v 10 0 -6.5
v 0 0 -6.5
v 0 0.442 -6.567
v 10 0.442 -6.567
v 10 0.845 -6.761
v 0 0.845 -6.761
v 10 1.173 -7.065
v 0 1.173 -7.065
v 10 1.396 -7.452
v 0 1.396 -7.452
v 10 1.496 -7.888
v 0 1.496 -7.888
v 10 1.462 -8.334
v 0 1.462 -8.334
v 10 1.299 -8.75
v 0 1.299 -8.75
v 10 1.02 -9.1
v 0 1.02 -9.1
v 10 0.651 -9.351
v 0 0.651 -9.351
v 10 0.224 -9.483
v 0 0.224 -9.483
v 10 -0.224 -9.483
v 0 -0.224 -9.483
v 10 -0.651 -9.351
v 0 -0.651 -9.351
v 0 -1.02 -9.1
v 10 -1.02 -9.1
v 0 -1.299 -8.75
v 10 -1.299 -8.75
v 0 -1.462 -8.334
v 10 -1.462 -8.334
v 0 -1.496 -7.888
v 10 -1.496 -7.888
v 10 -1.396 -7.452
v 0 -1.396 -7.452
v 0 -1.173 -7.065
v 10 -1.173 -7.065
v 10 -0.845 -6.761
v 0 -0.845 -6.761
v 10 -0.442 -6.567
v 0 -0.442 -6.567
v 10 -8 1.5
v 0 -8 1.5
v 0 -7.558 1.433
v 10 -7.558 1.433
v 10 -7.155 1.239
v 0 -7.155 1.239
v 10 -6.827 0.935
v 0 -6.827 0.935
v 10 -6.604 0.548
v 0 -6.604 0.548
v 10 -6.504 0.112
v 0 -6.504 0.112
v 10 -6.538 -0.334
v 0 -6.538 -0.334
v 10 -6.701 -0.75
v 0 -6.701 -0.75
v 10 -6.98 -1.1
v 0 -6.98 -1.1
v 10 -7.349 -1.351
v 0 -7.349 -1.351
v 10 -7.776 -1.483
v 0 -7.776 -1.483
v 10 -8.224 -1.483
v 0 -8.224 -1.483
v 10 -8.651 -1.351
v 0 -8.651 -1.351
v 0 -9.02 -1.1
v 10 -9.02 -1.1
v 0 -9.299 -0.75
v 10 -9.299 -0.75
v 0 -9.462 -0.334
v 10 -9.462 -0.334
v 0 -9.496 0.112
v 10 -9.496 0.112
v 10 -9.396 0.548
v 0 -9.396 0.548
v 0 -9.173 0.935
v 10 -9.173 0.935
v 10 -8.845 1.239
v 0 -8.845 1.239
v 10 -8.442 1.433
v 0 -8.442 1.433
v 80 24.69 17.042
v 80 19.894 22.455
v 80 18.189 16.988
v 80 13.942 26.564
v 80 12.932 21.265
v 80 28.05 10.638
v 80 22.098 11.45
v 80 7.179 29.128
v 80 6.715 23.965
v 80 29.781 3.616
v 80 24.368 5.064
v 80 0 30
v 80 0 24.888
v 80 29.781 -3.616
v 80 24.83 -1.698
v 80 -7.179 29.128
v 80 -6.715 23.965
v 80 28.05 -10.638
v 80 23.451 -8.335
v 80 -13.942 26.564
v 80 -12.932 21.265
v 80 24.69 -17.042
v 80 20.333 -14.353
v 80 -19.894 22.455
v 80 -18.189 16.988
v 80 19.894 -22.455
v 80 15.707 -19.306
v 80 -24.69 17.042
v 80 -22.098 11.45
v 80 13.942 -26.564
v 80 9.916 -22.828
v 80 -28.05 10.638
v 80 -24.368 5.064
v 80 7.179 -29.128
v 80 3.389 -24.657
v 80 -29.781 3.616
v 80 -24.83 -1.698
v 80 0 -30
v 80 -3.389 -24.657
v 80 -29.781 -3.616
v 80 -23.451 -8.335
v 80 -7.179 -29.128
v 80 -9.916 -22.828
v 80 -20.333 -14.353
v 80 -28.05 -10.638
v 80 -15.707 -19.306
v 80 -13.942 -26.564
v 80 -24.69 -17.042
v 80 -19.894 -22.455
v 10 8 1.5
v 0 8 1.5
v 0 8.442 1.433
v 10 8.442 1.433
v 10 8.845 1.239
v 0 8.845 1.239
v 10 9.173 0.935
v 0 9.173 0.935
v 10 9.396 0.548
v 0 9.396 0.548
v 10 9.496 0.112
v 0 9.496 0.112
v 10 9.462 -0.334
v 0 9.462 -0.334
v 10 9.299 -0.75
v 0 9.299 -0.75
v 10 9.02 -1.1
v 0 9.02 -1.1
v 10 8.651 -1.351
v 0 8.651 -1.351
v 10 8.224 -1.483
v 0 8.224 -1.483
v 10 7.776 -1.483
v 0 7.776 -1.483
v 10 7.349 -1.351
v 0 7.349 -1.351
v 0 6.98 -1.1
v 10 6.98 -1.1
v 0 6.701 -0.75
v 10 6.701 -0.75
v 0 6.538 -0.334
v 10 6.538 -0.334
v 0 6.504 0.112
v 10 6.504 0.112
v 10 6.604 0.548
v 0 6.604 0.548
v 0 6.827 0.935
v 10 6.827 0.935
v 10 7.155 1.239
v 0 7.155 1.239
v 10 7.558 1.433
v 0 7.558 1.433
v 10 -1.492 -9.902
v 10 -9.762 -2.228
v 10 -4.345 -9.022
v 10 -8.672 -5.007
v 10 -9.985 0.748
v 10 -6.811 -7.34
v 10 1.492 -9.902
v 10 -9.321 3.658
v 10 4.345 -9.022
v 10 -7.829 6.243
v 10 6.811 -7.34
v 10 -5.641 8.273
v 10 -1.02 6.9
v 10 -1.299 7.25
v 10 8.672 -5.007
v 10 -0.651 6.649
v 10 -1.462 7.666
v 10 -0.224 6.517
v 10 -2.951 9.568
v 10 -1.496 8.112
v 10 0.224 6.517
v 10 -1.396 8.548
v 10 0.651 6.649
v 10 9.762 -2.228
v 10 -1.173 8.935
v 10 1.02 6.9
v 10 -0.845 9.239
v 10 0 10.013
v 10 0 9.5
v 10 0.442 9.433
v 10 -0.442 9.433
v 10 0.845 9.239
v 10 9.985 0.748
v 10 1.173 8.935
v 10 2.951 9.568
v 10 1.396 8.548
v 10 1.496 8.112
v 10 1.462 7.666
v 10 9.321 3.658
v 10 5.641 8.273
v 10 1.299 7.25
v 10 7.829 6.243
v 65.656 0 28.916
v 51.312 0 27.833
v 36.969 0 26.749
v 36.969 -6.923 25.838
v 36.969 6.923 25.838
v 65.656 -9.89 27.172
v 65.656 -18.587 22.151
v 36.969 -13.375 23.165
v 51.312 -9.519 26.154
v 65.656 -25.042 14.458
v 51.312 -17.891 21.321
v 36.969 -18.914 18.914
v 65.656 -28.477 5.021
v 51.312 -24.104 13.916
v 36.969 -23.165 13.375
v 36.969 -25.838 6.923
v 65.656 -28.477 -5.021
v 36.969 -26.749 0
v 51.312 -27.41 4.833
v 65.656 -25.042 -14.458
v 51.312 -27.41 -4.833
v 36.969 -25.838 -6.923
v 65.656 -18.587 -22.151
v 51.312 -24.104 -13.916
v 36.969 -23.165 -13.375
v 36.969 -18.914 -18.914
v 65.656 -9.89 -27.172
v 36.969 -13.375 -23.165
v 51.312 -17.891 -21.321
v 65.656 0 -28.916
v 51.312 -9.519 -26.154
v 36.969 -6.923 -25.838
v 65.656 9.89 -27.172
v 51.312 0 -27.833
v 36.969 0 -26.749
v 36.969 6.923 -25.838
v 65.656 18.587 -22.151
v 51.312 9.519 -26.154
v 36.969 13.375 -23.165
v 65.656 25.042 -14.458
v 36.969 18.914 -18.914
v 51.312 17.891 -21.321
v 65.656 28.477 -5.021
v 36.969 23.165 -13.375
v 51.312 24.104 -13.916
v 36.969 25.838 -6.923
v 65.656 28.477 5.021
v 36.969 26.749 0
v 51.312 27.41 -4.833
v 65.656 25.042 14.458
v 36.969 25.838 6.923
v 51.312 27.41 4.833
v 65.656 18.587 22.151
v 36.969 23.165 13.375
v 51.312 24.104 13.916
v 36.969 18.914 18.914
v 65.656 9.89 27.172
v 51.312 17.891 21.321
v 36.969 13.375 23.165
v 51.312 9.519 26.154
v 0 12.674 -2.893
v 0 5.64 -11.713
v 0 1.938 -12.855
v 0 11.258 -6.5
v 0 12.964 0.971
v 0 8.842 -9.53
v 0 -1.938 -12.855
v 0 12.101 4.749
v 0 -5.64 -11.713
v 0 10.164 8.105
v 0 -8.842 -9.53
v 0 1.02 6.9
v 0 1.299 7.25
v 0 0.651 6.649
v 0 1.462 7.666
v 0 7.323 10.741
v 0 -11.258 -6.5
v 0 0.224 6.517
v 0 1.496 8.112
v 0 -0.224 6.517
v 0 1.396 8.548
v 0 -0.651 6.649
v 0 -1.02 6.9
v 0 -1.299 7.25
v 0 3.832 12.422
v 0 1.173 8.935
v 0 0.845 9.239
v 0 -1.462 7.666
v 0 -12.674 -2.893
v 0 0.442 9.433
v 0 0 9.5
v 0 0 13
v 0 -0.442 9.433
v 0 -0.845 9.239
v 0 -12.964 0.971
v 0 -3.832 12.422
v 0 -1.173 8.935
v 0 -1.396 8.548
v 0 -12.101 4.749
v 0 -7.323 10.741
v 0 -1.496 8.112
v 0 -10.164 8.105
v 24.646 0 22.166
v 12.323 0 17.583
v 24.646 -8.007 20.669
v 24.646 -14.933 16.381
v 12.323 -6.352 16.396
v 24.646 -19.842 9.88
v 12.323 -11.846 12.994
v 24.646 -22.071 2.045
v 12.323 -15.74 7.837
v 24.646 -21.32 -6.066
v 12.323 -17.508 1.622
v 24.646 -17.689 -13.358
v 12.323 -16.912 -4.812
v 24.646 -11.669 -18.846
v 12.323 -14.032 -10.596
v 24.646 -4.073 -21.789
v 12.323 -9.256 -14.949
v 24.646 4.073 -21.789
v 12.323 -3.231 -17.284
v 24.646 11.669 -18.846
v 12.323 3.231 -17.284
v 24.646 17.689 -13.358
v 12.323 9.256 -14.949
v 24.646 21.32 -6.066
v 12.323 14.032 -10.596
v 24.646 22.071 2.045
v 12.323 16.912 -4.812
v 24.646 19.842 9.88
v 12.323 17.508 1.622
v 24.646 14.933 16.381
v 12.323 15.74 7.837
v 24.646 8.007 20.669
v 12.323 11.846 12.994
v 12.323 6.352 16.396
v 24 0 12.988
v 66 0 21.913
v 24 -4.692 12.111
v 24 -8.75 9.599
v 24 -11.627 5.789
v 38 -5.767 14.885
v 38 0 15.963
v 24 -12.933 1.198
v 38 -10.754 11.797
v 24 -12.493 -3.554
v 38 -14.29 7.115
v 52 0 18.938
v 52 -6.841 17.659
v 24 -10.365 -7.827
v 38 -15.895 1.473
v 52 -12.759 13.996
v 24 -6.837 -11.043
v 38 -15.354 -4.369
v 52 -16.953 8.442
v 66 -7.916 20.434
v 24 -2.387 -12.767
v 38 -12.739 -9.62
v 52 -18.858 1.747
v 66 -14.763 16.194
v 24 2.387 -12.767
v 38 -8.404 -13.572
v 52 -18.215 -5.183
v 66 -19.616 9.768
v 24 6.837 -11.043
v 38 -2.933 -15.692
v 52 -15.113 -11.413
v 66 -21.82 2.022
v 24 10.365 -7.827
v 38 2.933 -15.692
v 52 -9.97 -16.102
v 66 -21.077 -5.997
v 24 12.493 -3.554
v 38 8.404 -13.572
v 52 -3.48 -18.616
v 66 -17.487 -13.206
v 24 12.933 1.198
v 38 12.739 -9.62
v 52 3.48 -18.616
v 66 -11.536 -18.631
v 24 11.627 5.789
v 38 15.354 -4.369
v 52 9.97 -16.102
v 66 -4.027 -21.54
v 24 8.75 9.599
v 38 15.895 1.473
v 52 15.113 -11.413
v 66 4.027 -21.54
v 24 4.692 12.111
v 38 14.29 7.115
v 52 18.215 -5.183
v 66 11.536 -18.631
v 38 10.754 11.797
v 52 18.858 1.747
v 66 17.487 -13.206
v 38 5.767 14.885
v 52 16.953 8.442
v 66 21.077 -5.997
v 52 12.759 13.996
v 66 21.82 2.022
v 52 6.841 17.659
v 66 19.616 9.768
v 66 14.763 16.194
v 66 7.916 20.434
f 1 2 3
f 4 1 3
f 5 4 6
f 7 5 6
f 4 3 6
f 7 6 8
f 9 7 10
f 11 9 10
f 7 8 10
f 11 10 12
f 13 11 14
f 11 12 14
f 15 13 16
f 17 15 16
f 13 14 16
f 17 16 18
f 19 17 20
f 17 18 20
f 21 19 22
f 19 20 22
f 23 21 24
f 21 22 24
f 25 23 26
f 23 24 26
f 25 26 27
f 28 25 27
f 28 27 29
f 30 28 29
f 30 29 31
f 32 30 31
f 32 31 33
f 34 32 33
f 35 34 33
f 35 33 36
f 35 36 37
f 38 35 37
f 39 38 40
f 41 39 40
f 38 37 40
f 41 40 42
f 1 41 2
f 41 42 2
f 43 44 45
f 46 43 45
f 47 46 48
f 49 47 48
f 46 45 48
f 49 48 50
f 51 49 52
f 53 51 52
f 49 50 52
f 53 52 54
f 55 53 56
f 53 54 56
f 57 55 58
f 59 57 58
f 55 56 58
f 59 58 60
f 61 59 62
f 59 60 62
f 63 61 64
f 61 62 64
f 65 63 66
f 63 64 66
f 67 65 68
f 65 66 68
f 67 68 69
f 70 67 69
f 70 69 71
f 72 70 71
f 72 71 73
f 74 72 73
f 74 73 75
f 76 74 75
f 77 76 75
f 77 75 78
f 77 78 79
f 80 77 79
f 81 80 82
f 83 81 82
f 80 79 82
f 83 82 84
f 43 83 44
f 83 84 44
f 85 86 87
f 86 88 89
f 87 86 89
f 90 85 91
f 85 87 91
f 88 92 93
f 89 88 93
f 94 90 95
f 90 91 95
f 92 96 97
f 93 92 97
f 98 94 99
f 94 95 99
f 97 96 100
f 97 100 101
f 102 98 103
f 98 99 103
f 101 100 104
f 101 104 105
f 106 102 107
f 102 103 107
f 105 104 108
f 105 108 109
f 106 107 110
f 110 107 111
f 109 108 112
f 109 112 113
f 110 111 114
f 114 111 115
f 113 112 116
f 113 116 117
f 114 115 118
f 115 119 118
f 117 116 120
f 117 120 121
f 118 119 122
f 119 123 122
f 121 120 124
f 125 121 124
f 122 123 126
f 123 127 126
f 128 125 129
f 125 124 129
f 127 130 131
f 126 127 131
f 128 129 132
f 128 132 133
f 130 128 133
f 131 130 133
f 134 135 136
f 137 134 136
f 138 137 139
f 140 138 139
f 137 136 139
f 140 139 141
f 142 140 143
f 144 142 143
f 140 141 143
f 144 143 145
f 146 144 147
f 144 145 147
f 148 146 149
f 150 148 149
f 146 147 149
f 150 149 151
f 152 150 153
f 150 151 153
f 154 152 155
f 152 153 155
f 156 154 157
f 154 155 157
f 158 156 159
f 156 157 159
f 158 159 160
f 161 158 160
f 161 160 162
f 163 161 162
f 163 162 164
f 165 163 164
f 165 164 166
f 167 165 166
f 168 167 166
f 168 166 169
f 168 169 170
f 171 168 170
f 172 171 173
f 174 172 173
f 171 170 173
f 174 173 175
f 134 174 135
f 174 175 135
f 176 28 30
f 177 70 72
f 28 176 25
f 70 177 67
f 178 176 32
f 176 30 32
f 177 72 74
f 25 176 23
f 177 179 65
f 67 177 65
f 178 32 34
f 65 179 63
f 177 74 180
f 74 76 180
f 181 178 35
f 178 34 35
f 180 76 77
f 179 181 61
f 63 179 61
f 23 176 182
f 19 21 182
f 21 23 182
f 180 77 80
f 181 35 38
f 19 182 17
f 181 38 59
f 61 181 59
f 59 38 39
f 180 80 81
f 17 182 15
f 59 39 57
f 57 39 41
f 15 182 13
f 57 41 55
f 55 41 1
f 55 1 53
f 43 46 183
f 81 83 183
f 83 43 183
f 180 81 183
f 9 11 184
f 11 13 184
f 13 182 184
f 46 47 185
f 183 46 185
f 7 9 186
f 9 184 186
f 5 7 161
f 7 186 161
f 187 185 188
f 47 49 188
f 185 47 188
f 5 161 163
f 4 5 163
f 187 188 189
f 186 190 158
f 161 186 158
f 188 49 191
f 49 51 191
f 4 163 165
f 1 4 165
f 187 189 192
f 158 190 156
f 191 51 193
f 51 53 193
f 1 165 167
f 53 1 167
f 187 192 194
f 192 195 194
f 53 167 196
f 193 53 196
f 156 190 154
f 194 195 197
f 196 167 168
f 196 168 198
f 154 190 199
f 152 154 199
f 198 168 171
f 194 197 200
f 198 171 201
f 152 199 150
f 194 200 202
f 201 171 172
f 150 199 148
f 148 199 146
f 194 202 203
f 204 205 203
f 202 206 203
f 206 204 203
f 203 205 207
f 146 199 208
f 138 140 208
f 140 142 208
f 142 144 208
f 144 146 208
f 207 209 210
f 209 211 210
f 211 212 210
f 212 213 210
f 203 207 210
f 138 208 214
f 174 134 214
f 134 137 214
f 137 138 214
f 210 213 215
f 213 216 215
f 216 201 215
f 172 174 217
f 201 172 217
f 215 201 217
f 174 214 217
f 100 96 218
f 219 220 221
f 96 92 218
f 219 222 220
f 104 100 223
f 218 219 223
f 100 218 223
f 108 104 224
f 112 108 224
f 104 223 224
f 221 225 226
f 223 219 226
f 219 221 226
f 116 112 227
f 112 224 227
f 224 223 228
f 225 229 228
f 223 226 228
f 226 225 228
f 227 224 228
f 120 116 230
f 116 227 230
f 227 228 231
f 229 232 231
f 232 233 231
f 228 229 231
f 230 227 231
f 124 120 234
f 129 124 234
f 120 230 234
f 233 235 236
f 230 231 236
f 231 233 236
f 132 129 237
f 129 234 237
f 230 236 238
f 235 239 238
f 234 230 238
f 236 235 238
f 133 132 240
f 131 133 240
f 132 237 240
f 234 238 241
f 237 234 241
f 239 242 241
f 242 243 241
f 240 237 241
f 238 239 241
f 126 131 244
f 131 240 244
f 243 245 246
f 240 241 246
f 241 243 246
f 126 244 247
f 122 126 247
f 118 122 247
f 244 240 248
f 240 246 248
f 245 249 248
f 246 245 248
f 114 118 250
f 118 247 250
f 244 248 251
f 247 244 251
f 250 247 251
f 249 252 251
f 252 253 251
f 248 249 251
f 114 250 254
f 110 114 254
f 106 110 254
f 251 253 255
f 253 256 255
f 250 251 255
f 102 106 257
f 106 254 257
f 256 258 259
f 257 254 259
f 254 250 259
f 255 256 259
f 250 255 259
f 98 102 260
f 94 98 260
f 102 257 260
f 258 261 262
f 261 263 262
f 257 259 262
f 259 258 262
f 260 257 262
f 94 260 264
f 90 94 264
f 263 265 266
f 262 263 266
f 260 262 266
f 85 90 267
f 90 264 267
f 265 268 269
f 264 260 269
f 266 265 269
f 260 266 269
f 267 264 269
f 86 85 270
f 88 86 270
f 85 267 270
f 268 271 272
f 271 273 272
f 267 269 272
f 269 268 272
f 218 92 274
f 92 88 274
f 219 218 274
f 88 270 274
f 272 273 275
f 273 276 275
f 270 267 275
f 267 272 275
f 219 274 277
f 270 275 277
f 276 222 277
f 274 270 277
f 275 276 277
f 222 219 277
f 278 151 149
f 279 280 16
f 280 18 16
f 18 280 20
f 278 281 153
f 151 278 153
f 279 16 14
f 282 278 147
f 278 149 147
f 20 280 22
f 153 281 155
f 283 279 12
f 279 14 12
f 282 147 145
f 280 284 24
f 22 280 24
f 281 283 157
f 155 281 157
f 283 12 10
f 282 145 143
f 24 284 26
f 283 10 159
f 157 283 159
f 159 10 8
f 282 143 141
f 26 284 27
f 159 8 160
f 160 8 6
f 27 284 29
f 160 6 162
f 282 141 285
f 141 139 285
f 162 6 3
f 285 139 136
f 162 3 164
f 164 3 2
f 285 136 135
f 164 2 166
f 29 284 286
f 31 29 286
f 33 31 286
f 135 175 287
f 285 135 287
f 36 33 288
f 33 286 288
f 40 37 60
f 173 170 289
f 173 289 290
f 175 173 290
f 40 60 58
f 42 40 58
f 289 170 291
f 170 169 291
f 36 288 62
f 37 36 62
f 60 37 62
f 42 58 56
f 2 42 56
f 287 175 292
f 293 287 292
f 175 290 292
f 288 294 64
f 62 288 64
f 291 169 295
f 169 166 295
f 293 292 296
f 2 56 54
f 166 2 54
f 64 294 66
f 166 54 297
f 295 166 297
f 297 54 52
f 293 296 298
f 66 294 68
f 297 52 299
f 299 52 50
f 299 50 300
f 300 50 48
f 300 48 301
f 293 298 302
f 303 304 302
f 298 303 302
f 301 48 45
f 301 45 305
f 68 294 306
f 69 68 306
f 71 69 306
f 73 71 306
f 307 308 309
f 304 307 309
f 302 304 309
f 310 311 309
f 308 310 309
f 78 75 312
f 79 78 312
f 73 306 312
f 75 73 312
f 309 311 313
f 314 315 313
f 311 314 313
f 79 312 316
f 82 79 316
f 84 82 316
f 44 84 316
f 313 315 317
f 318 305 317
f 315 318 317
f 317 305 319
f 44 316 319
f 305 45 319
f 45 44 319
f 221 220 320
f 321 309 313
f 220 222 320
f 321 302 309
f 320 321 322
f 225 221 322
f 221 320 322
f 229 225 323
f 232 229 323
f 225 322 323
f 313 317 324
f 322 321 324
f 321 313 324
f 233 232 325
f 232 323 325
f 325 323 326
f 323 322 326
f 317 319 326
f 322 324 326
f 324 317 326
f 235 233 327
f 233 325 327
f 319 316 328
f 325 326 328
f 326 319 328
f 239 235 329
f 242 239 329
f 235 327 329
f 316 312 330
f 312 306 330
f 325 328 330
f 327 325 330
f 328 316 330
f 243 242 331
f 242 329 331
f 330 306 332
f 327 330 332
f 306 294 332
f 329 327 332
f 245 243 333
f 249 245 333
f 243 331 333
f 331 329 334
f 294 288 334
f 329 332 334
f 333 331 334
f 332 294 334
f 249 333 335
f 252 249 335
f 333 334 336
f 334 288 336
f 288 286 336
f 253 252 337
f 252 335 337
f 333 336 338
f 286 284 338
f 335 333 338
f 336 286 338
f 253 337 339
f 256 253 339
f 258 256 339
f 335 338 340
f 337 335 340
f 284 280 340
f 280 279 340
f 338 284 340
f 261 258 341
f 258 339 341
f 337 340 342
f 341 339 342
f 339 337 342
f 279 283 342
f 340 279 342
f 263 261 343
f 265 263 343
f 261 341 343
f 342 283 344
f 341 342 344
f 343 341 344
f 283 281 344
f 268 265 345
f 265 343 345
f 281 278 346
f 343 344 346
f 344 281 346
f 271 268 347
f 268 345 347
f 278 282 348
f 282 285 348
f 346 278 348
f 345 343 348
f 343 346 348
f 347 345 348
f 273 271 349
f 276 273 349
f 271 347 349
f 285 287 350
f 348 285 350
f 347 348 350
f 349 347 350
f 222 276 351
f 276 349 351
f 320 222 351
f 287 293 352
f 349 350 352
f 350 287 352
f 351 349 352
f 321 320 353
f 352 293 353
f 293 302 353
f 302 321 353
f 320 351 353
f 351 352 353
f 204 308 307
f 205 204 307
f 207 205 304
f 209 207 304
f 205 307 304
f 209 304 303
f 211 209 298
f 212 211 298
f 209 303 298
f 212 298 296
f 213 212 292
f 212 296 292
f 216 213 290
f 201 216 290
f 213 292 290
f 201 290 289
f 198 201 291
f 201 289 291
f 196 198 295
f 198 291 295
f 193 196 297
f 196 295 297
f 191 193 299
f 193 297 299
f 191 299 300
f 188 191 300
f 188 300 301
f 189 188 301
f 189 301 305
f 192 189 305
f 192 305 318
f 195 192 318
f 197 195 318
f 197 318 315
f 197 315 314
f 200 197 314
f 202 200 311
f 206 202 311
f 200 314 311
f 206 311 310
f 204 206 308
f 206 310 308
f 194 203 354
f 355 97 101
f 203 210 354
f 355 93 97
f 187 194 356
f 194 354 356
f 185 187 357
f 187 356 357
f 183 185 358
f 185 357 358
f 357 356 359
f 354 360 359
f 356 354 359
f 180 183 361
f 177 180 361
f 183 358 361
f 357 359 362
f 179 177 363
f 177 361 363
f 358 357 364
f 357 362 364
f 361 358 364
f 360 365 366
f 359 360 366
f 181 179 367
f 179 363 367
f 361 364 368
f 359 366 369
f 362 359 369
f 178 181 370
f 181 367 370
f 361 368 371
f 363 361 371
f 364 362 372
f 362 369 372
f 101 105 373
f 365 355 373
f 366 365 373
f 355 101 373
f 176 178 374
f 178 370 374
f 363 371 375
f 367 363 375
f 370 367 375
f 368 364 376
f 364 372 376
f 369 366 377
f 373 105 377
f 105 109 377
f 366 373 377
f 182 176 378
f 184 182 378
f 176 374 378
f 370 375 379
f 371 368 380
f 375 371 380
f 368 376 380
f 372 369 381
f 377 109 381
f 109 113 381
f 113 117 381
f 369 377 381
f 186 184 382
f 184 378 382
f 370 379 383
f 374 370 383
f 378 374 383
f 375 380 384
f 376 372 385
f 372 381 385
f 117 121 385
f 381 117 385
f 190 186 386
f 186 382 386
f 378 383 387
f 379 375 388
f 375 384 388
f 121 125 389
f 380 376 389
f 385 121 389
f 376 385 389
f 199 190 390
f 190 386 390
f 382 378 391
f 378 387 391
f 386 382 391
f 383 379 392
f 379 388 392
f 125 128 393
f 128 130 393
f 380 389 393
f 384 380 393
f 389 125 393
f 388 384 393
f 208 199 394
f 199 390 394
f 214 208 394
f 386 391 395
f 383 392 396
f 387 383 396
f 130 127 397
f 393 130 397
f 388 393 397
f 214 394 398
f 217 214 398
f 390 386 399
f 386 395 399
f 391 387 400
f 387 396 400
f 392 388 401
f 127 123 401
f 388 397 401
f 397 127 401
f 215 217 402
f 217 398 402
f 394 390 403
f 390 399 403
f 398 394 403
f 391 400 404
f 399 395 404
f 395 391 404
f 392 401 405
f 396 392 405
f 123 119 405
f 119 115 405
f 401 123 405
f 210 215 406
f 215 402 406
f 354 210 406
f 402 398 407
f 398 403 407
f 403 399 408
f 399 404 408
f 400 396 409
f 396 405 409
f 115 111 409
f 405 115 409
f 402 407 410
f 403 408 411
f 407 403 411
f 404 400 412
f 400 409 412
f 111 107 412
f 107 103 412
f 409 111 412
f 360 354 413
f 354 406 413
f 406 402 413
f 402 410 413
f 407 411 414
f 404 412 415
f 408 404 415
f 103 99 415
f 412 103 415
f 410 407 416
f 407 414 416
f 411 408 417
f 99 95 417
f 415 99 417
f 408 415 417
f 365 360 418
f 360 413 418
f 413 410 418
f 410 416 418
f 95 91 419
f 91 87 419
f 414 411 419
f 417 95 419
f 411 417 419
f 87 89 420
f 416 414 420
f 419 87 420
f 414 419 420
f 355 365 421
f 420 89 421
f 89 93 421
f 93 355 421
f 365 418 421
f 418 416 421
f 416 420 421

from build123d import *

# Parameters (mm, degrees)
SKETCH6_R           = 13
BOSS_EXTRUDE1_DEPTH = 10
SKETCH7_R           = 1.5
CUT_EXTRUDE1_DEPTH  = 10


with BuildPart() as part:
    # Sketch2 → Revolve5 (revolve)
    with BuildSketch(Plane.XY, mode=Mode.PRIVATE) as revolve5_sk:
        Polygon((0, 13), (0, 7.888355817), (80, 24.888355817), (80, 30), (36.968539733, 26.749080476), align=None)
    revolve(revolve5_sk.sketch.rotate(Axis((0, 0, 0), (1, 0, 0)), 90), axis=Axis((0, 0, 0), (1, 0, 0)))

    # Sketch6 → Boss-Extrude1 (add)
    with BuildSketch(Plane.ZY):
        Circle(SKETCH6_R)
    extrude(amount=-BOSS_EXTRUDE1_DEPTH)

    # Sketch7 → Cut-Extrude1 (cut)
    with BuildSketch(Plane.ZY):
        with Locations((0, 8)):
            Circle(SKETCH7_R)
        with Locations((0, -8)):
            Circle(SKETCH7_R)
        with Locations((8, 0)):
            Circle(SKETCH7_R)
        with Locations((-8, 0)):
            Circle(SKETCH7_R)
    extrude(amount=-CUT_EXTRUDE1_DEPTH, mode=Mode.SUBTRACT)


solid = part.part
